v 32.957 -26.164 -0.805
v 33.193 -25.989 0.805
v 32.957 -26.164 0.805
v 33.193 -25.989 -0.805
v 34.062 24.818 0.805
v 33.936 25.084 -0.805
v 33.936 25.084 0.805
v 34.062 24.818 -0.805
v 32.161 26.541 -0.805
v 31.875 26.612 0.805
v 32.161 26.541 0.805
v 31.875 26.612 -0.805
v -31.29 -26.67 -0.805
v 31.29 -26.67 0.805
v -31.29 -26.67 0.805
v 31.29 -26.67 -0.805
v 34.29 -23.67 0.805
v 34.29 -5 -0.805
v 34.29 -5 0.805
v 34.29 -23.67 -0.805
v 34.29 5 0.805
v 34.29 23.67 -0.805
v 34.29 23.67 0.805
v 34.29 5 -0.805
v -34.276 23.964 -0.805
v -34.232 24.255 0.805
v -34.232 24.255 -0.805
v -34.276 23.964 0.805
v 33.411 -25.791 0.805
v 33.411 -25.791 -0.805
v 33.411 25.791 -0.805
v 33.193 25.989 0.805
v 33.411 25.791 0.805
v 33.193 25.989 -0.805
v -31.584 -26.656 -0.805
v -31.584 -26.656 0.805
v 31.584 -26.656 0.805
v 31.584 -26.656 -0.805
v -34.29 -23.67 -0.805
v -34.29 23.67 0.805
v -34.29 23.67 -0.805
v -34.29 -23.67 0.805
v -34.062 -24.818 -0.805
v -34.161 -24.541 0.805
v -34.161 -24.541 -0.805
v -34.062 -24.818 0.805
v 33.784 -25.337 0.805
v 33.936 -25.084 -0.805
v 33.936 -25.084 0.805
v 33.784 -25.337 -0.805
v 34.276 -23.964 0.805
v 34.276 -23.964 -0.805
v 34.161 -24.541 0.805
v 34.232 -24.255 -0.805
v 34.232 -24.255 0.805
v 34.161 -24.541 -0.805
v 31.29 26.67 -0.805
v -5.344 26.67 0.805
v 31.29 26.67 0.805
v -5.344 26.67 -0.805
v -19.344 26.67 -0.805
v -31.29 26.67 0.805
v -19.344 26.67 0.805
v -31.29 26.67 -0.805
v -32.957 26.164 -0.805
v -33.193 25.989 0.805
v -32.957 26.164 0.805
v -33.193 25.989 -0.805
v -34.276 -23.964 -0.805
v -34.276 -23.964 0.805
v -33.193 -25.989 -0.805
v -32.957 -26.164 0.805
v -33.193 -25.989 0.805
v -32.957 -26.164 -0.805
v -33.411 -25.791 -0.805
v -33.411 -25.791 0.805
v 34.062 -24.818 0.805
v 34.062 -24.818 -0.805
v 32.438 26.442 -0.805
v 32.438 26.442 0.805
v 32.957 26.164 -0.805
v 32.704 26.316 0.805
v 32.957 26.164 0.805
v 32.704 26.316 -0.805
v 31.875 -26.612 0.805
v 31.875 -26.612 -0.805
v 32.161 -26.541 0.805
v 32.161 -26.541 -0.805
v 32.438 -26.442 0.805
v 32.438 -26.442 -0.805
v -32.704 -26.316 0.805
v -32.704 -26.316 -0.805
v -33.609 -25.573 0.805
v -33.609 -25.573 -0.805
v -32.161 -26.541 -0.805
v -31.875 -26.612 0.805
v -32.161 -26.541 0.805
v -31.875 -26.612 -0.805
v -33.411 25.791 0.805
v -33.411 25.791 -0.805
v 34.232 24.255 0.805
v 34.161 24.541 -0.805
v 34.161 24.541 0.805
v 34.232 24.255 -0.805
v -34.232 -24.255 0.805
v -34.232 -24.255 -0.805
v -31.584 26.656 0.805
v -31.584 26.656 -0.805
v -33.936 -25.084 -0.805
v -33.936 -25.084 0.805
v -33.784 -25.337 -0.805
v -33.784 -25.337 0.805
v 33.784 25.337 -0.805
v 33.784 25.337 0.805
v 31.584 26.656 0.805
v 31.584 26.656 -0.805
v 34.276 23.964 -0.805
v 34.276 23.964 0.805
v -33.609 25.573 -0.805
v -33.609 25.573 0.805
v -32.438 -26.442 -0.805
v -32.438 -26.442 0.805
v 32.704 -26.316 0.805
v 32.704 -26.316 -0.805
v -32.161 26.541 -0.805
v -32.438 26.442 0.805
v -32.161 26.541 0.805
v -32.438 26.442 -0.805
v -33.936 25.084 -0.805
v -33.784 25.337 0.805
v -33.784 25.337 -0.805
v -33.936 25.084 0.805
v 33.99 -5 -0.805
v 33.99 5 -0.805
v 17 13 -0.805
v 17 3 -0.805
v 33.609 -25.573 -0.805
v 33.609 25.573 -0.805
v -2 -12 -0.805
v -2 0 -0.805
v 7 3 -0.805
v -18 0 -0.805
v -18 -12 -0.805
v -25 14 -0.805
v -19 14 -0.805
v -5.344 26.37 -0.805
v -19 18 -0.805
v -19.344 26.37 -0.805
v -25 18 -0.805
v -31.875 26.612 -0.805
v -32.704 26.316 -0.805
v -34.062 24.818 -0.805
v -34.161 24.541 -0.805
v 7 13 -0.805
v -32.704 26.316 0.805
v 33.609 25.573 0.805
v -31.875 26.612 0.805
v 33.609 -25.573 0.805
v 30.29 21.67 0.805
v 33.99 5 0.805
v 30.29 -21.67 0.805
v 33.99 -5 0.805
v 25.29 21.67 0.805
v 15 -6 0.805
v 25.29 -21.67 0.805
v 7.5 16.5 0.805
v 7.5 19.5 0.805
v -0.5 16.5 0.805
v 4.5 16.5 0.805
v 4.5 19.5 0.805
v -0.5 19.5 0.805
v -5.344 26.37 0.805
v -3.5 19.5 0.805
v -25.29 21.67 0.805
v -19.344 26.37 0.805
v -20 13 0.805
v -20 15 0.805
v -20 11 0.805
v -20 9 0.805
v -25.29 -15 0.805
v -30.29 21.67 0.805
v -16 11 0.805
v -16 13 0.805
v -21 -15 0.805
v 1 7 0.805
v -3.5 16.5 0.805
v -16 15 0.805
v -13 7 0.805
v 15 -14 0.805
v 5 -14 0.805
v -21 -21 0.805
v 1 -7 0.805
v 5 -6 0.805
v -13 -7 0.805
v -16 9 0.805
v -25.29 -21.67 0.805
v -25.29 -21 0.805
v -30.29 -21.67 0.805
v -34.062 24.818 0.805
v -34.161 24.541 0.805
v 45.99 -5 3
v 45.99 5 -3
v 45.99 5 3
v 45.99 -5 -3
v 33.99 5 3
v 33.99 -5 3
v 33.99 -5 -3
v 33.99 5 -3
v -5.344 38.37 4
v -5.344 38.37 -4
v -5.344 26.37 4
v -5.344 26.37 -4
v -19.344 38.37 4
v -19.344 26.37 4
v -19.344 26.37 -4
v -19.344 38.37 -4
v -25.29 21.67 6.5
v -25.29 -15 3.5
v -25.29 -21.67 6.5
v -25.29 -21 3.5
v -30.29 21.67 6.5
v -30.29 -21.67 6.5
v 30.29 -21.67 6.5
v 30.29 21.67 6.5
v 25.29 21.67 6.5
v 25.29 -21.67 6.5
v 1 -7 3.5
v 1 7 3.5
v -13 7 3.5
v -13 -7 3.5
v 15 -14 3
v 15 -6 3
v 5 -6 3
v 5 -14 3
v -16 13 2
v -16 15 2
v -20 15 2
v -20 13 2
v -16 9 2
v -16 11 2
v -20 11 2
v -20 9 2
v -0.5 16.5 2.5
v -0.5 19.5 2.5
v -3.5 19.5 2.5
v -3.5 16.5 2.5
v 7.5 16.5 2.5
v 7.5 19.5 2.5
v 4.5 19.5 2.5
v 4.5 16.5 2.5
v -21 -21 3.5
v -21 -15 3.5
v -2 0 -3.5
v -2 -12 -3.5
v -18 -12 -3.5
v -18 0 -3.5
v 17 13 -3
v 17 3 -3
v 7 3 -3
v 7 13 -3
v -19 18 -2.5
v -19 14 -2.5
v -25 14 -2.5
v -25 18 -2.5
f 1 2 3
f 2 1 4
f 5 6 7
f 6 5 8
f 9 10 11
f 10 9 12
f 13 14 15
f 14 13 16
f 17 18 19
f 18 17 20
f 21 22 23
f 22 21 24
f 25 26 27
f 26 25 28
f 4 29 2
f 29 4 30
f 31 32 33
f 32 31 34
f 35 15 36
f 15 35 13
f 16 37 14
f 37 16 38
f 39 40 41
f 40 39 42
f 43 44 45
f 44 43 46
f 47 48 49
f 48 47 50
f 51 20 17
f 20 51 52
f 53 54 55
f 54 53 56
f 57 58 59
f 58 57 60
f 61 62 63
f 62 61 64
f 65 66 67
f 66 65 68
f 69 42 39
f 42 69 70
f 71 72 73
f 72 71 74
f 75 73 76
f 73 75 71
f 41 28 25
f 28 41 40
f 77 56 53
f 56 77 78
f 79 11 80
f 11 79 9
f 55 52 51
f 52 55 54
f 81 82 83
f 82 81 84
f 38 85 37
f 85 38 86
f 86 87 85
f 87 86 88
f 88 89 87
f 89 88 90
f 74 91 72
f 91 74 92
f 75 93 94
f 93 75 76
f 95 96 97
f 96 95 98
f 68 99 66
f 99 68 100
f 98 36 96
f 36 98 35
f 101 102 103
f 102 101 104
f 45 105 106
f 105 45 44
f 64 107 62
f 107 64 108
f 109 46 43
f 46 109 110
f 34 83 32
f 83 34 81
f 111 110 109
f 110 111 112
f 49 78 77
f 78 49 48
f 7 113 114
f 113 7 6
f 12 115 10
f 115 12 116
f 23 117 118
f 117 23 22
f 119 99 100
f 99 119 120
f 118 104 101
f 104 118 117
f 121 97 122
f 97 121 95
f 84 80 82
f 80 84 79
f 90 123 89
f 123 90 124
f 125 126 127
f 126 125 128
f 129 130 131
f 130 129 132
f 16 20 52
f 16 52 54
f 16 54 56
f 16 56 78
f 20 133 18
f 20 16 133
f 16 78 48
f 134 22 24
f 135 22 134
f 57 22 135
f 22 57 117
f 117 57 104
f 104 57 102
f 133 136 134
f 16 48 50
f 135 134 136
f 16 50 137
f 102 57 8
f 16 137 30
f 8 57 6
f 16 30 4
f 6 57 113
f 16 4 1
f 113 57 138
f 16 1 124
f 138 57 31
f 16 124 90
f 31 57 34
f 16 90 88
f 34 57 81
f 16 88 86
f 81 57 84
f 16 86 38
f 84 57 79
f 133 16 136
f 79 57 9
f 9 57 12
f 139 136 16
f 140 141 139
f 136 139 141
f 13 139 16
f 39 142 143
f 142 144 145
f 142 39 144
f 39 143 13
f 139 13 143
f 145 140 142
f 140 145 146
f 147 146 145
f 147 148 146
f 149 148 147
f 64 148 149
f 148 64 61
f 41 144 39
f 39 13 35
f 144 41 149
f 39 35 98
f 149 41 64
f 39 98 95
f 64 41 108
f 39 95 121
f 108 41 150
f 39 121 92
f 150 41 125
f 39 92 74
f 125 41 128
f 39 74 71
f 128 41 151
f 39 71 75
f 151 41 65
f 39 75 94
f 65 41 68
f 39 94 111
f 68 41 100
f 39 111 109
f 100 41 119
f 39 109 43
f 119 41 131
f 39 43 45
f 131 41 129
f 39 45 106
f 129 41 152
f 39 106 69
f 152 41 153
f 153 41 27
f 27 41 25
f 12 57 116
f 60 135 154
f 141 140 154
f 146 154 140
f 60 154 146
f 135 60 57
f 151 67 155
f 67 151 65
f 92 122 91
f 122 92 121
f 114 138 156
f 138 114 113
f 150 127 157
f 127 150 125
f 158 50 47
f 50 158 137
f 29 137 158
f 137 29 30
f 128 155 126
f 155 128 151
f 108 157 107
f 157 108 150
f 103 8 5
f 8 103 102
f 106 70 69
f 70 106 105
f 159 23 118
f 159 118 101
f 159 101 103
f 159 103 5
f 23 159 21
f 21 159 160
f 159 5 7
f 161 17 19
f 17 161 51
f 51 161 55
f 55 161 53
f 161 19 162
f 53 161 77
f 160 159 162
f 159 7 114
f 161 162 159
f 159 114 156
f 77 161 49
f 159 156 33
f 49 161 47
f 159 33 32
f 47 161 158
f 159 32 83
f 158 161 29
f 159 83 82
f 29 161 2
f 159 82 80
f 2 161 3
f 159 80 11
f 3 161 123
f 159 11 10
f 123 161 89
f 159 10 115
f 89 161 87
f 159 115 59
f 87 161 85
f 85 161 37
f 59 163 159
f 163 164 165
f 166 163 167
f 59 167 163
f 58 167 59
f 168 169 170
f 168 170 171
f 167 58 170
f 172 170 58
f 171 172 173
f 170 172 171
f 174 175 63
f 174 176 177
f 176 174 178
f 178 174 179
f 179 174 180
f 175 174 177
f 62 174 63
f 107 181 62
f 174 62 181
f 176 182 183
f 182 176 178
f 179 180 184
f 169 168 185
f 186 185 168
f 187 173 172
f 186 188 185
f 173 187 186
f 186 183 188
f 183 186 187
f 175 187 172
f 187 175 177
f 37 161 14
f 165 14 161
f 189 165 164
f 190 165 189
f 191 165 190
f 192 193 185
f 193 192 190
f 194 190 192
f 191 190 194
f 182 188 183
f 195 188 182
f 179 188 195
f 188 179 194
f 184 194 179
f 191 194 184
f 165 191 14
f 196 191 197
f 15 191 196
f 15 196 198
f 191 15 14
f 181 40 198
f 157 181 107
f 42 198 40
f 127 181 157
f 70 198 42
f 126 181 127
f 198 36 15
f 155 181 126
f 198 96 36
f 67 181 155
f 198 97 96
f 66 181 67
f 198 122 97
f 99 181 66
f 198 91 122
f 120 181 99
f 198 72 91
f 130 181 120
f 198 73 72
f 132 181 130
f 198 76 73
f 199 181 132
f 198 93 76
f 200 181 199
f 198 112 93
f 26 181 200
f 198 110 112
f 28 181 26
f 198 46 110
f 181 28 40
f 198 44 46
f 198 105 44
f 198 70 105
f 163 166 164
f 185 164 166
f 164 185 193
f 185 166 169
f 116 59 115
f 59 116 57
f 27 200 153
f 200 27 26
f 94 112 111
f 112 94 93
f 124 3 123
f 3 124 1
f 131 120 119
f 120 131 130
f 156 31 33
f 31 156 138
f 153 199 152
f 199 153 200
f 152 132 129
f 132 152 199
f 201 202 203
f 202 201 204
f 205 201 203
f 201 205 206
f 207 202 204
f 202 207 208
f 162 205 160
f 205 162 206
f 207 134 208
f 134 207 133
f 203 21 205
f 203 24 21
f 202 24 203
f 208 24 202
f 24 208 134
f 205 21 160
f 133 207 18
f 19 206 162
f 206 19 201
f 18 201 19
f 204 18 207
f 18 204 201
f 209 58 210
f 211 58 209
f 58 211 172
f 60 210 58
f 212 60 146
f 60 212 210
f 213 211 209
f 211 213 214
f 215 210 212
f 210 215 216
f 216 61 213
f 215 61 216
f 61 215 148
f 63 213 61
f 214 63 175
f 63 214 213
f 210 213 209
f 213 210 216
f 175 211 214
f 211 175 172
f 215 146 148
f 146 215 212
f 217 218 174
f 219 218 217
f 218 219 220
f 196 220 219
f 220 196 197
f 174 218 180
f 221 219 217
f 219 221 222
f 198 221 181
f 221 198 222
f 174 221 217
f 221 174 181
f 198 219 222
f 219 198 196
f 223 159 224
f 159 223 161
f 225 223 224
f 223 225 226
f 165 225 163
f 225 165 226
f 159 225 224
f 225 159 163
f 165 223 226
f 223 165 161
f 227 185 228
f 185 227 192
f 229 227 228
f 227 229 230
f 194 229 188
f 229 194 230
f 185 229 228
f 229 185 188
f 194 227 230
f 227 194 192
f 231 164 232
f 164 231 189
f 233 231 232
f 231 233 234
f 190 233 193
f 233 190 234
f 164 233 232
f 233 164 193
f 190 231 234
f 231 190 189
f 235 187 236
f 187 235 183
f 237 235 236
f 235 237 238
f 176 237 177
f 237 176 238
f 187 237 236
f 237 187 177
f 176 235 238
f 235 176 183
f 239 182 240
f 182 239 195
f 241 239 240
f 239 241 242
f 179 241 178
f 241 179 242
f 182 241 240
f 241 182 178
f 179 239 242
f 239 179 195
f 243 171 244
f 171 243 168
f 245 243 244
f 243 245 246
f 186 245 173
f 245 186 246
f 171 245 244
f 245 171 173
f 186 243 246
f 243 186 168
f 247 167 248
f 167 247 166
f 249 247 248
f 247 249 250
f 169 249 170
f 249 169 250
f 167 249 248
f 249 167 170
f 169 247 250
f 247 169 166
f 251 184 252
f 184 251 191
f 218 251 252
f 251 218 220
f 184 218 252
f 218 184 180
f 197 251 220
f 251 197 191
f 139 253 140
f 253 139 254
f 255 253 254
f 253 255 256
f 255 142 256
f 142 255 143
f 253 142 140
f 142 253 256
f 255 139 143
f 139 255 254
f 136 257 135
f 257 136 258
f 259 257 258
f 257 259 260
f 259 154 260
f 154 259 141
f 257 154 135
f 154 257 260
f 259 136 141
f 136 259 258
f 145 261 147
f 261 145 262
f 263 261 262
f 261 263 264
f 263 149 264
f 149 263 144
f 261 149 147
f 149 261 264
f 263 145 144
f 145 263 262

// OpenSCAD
// Microcontroller development board (generic) - 68.58mm x 53.34mm x 1.6mm PCB
// Fixed: ensure visible geometry and ONE connected solid (no floating parts)

$fn = 64;

// Parameters
length = 68.58;      // X
width  = 53.34;      // Y
thickness = 1.6;     // Z (PCB)
corner_radius = 3.0; // rounded PCB corners

// Small overlap to guarantee connectivity between parts
overlap = 0.30;

// Rounded rectangle prism (centered at origin)
module rounded_box(size=[10,10,1], r=1) {
    x = size[0]; y = size[1]; z = size[2];
    rr = min(r, x/2, y/2);
    // Use minkowski for robust 3D rounded corners (always produces solid geometry)
    minkowski() {
        cube([x-2*rr, y-2*rr, z], center=true);
        cylinder(r=rr, h=0.01, center=true);
    }
}

// Component block that sits on top of PCB and overlaps slightly into it
module top_block(sz=[10,10,5], pos=[0,0], z_above=0) {
    translate([pos[0], pos[1], thickness/2 + sz[2]/2 - overlap + z_above])
        cube(sz, center=true);
}

// Component block that sits on bottom of PCB and overlaps slightly into it
module bottom_block(sz=[10,10,5], pos=[0,0], z_below=0) {
    translate([pos[0], pos[1], -(thickness/2 + sz[2]/2 - overlap + z_below)])
        cube(sz, center=true);
}

// Side connector protruding from X edge, overlapping into PCB
module side_connector_x(side=1, body=[12,10,6], y=0, z_center=0) {
    translate([side*(length/2 + body[0]/2 - overlap), y, z_center])
        cube(body, center=true);
}

// Side connector protruding from Y edge, overlapping into PCB
module side_connector_y(side=1, body=[10,12,6], x=0, z_center=0) {
    translate([x, side*(width/2 + body[1]/2 - overlap), z_center])
        cube(body, center=true);
}

module dev_board() {
    union() {
        // PCB
        rounded_box([length, width, thickness], r=corner_radius);

        // USB connector (right edge, centered on PCB thickness)
        side_connector_x(
            side=+1,
            body=[12, 10, 6],
            y=0,
            z_center=0
        );

        // Power jack / large connector (top edge)
        side_connector_y(
            side=+1,
            body=[14, 12, 8],
            x=-(length*0.18),
            z_center=0
        );

        // Pin header strips (two long blocks near left/right edges)
        header_h = 6;
        header_w = 5;
        header_len = width - 10;

        // Left header
        top_block(
            sz=[header_w, header_len, header_h],
            pos=[-(length/2 - header_w/2 - 4), 0]
        );

        // Right header
        top_block(
            sz=[header_w, header_len, header_h],
            pos=[+(length/2 - header_w/2 - 4), 0]
        );

        // Main MCU (center-ish)
        top_block(sz=[14, 14, 3], pos=[-6, 0]);

        // Secondary IC
        top_block(sz=[10, 8, 2.5], pos=[10, -10]);

        // A few small components (caps/resistors) for visual detail
        top_block(sz=[4, 2, 1.5], pos=[-18, 14]);
        top_block(sz=[4, 2, 1.5], pos=[-18, 10]);
        top_block(sz=[3, 3, 2.0], pos=[-2, 18]);
        top_block(sz=[3, 3, 2.0], pos=[6, 18]);

        // Reset button (small)
        top_block(sz=[6, 6, 3], pos=[-24, -18]);

        // Bottom-side components to match underside detail and ensure connectivity
        bottom_block(sz=[16, 12, 3.0], pos=[-10, -6]);
        bottom_block(sz=[10, 10, 2.5], pos=[12, 8]);
        bottom_block(sz=[6, 4, 2.0], pos=[-22, 16]);
    }
}

dev_board();
